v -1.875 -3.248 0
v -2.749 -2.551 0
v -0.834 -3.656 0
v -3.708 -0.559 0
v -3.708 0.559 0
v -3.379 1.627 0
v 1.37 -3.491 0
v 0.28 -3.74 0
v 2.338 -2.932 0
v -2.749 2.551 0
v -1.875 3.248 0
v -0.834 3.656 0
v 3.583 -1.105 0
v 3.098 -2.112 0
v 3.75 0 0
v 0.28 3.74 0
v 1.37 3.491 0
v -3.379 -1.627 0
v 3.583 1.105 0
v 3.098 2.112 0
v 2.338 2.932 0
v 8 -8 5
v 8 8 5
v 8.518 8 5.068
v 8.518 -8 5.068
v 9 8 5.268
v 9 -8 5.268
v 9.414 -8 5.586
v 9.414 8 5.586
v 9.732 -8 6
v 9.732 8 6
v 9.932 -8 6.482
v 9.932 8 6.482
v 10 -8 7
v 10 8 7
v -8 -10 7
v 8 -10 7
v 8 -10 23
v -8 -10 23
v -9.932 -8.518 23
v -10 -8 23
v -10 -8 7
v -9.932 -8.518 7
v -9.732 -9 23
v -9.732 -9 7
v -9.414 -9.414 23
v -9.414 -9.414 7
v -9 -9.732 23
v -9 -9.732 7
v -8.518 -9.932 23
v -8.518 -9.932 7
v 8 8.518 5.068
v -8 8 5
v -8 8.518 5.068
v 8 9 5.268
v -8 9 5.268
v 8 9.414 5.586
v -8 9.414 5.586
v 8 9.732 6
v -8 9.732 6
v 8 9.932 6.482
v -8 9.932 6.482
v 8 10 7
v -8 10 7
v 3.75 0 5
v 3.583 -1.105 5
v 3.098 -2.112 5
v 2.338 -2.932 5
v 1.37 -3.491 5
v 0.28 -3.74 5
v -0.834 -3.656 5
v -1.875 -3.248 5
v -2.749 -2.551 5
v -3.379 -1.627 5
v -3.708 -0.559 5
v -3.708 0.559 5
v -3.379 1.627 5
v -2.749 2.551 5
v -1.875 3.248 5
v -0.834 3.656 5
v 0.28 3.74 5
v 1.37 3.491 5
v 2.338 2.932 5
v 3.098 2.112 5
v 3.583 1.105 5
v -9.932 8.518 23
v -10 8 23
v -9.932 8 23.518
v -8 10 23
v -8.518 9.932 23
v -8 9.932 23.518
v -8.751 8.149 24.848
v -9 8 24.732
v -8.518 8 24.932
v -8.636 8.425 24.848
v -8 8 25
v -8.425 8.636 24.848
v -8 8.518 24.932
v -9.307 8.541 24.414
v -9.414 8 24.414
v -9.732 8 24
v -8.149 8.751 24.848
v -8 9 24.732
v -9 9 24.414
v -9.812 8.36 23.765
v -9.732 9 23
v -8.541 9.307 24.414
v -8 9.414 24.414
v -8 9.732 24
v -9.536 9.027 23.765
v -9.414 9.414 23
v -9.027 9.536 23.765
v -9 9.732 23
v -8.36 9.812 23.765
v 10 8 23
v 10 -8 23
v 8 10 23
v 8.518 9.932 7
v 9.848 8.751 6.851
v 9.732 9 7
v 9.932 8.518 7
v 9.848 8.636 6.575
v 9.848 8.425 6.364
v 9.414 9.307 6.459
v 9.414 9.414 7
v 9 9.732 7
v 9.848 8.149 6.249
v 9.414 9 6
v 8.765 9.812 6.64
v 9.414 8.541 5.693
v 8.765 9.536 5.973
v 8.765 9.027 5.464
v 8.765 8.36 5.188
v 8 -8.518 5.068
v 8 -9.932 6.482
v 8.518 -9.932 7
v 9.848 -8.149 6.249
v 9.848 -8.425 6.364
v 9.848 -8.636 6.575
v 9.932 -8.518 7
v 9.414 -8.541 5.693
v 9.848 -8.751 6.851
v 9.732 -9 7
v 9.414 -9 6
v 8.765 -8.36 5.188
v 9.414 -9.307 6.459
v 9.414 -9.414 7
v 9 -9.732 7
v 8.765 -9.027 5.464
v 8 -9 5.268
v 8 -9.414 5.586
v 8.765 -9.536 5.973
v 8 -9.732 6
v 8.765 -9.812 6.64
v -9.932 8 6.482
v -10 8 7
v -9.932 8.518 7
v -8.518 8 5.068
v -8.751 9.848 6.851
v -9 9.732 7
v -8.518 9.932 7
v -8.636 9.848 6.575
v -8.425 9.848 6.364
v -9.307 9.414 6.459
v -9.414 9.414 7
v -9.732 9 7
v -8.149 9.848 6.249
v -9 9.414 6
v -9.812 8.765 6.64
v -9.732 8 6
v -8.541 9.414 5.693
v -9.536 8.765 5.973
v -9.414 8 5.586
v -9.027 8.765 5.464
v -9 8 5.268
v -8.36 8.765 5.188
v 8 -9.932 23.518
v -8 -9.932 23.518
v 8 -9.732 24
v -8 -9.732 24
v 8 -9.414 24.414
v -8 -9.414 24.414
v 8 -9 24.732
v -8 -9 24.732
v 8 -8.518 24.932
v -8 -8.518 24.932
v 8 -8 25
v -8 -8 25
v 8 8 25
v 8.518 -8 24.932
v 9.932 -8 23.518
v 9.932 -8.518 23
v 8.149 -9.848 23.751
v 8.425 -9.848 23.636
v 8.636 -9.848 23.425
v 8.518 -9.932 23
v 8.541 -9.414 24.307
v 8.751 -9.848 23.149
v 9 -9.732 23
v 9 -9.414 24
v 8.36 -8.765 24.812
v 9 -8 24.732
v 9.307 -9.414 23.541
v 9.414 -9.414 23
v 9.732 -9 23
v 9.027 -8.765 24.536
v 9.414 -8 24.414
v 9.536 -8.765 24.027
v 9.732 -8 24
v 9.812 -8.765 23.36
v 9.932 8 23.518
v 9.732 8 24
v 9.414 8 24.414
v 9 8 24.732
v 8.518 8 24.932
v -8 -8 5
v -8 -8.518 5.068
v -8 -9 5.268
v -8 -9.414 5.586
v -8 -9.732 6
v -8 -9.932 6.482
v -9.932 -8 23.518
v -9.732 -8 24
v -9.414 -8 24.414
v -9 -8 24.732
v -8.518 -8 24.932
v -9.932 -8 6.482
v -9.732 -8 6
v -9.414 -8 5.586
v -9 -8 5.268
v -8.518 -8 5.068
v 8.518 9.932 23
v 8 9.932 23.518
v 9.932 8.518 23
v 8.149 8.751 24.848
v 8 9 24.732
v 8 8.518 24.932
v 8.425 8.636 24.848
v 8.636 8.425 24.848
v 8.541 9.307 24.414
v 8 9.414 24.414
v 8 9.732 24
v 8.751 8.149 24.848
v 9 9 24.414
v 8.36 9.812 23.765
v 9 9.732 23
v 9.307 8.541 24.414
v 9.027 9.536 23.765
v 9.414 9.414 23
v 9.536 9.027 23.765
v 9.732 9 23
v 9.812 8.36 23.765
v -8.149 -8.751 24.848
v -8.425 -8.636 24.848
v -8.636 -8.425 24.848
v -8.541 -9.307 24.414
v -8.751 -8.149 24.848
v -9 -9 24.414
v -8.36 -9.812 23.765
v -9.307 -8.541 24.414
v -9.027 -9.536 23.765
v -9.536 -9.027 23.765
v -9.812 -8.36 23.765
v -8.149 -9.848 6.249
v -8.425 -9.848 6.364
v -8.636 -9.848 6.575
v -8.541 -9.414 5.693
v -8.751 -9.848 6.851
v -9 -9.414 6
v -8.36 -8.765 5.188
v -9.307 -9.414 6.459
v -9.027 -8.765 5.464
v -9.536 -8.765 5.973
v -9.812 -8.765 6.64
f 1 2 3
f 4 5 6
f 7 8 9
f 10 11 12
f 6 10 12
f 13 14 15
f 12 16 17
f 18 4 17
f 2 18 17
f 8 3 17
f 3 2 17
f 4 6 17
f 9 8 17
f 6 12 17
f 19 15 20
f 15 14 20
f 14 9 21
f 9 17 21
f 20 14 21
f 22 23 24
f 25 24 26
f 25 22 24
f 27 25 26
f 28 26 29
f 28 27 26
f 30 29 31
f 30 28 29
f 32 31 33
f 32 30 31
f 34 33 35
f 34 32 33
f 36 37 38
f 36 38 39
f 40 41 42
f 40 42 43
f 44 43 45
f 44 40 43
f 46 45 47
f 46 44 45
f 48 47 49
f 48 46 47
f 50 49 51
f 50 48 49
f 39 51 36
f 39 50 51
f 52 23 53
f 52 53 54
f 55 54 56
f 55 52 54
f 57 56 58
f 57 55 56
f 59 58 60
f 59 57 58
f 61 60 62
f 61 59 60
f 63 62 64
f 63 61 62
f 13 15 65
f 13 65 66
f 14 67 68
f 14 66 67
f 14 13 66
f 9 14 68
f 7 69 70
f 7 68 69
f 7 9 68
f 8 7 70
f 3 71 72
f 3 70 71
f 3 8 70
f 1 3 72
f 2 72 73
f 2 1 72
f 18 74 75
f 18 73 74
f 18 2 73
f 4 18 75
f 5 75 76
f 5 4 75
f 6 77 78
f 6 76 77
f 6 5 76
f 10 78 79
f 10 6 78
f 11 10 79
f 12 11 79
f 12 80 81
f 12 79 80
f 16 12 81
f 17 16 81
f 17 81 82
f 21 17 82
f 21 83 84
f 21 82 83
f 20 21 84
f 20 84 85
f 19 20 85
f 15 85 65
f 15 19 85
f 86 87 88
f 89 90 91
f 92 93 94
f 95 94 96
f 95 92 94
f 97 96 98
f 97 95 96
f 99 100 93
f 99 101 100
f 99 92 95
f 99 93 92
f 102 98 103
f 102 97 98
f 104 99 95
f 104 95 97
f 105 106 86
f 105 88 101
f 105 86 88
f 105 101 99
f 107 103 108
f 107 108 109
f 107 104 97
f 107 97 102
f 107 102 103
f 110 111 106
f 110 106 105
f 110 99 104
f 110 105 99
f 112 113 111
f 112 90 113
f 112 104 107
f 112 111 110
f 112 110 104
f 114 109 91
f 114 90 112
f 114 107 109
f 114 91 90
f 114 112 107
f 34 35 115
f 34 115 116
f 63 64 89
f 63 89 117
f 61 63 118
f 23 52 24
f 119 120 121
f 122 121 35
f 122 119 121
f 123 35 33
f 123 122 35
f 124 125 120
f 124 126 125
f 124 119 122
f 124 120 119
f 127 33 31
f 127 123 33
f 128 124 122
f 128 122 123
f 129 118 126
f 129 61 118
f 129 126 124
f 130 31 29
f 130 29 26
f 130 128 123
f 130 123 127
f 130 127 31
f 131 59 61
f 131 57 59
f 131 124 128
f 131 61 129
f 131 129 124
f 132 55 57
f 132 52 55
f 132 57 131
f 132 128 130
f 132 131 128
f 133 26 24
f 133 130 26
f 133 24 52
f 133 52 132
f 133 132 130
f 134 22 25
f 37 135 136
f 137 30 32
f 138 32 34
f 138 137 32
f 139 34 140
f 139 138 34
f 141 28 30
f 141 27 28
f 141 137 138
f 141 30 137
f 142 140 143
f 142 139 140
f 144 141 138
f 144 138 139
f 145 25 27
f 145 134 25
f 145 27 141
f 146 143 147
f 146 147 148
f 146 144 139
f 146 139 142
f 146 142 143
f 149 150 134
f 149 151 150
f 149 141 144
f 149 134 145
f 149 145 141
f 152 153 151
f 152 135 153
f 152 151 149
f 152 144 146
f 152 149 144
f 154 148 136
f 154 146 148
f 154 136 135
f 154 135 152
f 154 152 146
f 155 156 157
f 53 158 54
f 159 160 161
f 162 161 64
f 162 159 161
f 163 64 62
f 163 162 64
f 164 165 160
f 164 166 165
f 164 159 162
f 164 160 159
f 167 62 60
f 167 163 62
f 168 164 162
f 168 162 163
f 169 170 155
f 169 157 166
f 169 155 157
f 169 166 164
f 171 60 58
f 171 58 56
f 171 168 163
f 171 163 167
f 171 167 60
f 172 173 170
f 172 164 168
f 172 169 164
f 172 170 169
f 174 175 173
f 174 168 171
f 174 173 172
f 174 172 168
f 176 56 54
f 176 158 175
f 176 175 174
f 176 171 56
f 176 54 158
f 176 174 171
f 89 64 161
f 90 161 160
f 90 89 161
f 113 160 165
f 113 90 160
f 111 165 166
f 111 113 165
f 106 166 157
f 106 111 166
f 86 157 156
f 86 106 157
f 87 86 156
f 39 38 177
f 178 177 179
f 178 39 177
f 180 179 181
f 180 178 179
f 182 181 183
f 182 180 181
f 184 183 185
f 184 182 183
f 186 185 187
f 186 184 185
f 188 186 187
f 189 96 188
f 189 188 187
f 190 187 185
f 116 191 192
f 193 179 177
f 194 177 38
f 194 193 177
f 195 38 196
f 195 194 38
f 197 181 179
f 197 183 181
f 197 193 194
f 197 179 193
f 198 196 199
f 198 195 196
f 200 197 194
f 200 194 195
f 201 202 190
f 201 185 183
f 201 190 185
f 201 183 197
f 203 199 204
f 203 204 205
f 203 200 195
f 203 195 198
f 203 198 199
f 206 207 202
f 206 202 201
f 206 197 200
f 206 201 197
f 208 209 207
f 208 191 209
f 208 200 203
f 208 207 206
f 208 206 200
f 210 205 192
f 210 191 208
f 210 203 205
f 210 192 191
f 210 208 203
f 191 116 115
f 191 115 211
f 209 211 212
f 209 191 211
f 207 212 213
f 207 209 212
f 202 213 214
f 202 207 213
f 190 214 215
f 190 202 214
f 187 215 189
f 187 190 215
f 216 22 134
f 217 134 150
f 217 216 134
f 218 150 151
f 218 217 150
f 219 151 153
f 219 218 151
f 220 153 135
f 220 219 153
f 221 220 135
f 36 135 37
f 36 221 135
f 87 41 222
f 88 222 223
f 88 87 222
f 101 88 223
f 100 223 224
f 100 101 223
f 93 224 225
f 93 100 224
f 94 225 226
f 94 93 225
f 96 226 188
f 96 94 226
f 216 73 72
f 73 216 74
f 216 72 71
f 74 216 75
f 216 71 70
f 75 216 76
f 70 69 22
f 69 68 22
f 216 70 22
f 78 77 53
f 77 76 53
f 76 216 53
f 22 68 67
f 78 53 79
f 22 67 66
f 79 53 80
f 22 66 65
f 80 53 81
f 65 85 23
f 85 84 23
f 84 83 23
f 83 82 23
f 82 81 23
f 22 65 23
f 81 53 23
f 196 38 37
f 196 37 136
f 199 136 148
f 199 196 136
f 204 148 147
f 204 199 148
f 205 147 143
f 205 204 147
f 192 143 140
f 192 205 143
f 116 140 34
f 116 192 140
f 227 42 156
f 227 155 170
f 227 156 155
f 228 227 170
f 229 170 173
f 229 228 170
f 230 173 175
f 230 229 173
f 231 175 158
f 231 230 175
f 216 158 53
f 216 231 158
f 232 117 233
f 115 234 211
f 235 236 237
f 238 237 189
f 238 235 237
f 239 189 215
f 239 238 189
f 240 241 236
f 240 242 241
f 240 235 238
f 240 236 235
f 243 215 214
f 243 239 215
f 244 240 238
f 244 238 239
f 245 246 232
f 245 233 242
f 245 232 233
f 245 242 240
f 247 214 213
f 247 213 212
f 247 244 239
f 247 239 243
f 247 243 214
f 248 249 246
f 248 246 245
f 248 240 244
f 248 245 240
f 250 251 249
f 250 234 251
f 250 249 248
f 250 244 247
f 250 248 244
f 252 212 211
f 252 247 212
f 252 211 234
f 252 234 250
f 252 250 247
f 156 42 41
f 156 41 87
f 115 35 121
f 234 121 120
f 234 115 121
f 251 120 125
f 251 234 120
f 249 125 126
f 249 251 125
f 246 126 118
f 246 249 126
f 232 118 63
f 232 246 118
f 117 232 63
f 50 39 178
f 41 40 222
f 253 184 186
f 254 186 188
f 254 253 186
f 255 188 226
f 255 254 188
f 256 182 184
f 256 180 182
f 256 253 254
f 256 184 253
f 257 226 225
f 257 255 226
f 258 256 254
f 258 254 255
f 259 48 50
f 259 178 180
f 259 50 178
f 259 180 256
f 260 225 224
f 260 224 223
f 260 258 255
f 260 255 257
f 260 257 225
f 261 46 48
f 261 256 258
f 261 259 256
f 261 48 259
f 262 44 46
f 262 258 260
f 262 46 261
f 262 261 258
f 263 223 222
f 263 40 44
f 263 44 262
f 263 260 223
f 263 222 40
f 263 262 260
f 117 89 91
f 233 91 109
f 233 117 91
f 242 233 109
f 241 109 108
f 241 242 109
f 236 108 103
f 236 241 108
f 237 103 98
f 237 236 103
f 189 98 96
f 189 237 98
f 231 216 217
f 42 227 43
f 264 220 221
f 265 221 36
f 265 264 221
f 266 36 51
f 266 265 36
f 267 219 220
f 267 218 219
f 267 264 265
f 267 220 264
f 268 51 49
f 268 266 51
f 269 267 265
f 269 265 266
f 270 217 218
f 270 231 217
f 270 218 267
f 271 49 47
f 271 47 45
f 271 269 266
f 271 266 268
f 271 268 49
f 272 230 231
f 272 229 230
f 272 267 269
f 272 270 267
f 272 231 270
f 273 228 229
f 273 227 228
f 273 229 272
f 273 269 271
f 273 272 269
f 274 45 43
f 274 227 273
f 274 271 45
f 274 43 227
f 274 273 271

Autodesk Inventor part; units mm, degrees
ref_plane "YZ Plane" through (0, 0, 0) normal (1, 0, 0) x (0, 1, 0)
ref_plane "XZ Plane" through (0, 0, 0) normal (0, 1, 0) x (-1, 0, 0)
ref_plane "XY Plane" through (0, 0, 0) normal (0, 0, 1) x (1, 0, 0)
sketch "Sketch5" plane through (0, 0, 0) normal (0, 0, 1) x (1, 0, 0)
  circle A0 centre (0, 0) radius 3.75
  dimension "d11" = 7.5
extrude "Extrusion4" add sketch "Sketch5" along normal blind 5
sketch "Sketch6" plane through (0, 0, 5) normal (0, 0, 1) x (1, 0, 0)
  line L0 (0, 0) -> (-10, 0)
  line L1 (-10, 0) -> (-10, 10)
  line L2 (-10, 10) -> (10, 10)
  line L3 (10, 10) -> (10, -10)
  line L4 (10, -10) -> (-10, -10)
  line L5 (-10, -10) -> (-10, 0)
  dimension "d19" = 10
  dimension "d20" = 10
  dimension "d21" = 20
  dimension "d22" = 20
  dimension "d23" = 20
extrude "Extrusion5" add sketch "Sketch6" along normal blind 20
fillet "Fillet1" radius 2 12 edges at (-10, 0, 5) (0, -10, 5) (-10, -10, 15) (0, 10, 5) (10, 10, 15) (10, 0, 5) (-10, 10, 15) (-10, 0, 25) (0, 10, 25) (10, 0, 25) (0, -10, 25) (10, -10, 15)
properties part number "Holder"
